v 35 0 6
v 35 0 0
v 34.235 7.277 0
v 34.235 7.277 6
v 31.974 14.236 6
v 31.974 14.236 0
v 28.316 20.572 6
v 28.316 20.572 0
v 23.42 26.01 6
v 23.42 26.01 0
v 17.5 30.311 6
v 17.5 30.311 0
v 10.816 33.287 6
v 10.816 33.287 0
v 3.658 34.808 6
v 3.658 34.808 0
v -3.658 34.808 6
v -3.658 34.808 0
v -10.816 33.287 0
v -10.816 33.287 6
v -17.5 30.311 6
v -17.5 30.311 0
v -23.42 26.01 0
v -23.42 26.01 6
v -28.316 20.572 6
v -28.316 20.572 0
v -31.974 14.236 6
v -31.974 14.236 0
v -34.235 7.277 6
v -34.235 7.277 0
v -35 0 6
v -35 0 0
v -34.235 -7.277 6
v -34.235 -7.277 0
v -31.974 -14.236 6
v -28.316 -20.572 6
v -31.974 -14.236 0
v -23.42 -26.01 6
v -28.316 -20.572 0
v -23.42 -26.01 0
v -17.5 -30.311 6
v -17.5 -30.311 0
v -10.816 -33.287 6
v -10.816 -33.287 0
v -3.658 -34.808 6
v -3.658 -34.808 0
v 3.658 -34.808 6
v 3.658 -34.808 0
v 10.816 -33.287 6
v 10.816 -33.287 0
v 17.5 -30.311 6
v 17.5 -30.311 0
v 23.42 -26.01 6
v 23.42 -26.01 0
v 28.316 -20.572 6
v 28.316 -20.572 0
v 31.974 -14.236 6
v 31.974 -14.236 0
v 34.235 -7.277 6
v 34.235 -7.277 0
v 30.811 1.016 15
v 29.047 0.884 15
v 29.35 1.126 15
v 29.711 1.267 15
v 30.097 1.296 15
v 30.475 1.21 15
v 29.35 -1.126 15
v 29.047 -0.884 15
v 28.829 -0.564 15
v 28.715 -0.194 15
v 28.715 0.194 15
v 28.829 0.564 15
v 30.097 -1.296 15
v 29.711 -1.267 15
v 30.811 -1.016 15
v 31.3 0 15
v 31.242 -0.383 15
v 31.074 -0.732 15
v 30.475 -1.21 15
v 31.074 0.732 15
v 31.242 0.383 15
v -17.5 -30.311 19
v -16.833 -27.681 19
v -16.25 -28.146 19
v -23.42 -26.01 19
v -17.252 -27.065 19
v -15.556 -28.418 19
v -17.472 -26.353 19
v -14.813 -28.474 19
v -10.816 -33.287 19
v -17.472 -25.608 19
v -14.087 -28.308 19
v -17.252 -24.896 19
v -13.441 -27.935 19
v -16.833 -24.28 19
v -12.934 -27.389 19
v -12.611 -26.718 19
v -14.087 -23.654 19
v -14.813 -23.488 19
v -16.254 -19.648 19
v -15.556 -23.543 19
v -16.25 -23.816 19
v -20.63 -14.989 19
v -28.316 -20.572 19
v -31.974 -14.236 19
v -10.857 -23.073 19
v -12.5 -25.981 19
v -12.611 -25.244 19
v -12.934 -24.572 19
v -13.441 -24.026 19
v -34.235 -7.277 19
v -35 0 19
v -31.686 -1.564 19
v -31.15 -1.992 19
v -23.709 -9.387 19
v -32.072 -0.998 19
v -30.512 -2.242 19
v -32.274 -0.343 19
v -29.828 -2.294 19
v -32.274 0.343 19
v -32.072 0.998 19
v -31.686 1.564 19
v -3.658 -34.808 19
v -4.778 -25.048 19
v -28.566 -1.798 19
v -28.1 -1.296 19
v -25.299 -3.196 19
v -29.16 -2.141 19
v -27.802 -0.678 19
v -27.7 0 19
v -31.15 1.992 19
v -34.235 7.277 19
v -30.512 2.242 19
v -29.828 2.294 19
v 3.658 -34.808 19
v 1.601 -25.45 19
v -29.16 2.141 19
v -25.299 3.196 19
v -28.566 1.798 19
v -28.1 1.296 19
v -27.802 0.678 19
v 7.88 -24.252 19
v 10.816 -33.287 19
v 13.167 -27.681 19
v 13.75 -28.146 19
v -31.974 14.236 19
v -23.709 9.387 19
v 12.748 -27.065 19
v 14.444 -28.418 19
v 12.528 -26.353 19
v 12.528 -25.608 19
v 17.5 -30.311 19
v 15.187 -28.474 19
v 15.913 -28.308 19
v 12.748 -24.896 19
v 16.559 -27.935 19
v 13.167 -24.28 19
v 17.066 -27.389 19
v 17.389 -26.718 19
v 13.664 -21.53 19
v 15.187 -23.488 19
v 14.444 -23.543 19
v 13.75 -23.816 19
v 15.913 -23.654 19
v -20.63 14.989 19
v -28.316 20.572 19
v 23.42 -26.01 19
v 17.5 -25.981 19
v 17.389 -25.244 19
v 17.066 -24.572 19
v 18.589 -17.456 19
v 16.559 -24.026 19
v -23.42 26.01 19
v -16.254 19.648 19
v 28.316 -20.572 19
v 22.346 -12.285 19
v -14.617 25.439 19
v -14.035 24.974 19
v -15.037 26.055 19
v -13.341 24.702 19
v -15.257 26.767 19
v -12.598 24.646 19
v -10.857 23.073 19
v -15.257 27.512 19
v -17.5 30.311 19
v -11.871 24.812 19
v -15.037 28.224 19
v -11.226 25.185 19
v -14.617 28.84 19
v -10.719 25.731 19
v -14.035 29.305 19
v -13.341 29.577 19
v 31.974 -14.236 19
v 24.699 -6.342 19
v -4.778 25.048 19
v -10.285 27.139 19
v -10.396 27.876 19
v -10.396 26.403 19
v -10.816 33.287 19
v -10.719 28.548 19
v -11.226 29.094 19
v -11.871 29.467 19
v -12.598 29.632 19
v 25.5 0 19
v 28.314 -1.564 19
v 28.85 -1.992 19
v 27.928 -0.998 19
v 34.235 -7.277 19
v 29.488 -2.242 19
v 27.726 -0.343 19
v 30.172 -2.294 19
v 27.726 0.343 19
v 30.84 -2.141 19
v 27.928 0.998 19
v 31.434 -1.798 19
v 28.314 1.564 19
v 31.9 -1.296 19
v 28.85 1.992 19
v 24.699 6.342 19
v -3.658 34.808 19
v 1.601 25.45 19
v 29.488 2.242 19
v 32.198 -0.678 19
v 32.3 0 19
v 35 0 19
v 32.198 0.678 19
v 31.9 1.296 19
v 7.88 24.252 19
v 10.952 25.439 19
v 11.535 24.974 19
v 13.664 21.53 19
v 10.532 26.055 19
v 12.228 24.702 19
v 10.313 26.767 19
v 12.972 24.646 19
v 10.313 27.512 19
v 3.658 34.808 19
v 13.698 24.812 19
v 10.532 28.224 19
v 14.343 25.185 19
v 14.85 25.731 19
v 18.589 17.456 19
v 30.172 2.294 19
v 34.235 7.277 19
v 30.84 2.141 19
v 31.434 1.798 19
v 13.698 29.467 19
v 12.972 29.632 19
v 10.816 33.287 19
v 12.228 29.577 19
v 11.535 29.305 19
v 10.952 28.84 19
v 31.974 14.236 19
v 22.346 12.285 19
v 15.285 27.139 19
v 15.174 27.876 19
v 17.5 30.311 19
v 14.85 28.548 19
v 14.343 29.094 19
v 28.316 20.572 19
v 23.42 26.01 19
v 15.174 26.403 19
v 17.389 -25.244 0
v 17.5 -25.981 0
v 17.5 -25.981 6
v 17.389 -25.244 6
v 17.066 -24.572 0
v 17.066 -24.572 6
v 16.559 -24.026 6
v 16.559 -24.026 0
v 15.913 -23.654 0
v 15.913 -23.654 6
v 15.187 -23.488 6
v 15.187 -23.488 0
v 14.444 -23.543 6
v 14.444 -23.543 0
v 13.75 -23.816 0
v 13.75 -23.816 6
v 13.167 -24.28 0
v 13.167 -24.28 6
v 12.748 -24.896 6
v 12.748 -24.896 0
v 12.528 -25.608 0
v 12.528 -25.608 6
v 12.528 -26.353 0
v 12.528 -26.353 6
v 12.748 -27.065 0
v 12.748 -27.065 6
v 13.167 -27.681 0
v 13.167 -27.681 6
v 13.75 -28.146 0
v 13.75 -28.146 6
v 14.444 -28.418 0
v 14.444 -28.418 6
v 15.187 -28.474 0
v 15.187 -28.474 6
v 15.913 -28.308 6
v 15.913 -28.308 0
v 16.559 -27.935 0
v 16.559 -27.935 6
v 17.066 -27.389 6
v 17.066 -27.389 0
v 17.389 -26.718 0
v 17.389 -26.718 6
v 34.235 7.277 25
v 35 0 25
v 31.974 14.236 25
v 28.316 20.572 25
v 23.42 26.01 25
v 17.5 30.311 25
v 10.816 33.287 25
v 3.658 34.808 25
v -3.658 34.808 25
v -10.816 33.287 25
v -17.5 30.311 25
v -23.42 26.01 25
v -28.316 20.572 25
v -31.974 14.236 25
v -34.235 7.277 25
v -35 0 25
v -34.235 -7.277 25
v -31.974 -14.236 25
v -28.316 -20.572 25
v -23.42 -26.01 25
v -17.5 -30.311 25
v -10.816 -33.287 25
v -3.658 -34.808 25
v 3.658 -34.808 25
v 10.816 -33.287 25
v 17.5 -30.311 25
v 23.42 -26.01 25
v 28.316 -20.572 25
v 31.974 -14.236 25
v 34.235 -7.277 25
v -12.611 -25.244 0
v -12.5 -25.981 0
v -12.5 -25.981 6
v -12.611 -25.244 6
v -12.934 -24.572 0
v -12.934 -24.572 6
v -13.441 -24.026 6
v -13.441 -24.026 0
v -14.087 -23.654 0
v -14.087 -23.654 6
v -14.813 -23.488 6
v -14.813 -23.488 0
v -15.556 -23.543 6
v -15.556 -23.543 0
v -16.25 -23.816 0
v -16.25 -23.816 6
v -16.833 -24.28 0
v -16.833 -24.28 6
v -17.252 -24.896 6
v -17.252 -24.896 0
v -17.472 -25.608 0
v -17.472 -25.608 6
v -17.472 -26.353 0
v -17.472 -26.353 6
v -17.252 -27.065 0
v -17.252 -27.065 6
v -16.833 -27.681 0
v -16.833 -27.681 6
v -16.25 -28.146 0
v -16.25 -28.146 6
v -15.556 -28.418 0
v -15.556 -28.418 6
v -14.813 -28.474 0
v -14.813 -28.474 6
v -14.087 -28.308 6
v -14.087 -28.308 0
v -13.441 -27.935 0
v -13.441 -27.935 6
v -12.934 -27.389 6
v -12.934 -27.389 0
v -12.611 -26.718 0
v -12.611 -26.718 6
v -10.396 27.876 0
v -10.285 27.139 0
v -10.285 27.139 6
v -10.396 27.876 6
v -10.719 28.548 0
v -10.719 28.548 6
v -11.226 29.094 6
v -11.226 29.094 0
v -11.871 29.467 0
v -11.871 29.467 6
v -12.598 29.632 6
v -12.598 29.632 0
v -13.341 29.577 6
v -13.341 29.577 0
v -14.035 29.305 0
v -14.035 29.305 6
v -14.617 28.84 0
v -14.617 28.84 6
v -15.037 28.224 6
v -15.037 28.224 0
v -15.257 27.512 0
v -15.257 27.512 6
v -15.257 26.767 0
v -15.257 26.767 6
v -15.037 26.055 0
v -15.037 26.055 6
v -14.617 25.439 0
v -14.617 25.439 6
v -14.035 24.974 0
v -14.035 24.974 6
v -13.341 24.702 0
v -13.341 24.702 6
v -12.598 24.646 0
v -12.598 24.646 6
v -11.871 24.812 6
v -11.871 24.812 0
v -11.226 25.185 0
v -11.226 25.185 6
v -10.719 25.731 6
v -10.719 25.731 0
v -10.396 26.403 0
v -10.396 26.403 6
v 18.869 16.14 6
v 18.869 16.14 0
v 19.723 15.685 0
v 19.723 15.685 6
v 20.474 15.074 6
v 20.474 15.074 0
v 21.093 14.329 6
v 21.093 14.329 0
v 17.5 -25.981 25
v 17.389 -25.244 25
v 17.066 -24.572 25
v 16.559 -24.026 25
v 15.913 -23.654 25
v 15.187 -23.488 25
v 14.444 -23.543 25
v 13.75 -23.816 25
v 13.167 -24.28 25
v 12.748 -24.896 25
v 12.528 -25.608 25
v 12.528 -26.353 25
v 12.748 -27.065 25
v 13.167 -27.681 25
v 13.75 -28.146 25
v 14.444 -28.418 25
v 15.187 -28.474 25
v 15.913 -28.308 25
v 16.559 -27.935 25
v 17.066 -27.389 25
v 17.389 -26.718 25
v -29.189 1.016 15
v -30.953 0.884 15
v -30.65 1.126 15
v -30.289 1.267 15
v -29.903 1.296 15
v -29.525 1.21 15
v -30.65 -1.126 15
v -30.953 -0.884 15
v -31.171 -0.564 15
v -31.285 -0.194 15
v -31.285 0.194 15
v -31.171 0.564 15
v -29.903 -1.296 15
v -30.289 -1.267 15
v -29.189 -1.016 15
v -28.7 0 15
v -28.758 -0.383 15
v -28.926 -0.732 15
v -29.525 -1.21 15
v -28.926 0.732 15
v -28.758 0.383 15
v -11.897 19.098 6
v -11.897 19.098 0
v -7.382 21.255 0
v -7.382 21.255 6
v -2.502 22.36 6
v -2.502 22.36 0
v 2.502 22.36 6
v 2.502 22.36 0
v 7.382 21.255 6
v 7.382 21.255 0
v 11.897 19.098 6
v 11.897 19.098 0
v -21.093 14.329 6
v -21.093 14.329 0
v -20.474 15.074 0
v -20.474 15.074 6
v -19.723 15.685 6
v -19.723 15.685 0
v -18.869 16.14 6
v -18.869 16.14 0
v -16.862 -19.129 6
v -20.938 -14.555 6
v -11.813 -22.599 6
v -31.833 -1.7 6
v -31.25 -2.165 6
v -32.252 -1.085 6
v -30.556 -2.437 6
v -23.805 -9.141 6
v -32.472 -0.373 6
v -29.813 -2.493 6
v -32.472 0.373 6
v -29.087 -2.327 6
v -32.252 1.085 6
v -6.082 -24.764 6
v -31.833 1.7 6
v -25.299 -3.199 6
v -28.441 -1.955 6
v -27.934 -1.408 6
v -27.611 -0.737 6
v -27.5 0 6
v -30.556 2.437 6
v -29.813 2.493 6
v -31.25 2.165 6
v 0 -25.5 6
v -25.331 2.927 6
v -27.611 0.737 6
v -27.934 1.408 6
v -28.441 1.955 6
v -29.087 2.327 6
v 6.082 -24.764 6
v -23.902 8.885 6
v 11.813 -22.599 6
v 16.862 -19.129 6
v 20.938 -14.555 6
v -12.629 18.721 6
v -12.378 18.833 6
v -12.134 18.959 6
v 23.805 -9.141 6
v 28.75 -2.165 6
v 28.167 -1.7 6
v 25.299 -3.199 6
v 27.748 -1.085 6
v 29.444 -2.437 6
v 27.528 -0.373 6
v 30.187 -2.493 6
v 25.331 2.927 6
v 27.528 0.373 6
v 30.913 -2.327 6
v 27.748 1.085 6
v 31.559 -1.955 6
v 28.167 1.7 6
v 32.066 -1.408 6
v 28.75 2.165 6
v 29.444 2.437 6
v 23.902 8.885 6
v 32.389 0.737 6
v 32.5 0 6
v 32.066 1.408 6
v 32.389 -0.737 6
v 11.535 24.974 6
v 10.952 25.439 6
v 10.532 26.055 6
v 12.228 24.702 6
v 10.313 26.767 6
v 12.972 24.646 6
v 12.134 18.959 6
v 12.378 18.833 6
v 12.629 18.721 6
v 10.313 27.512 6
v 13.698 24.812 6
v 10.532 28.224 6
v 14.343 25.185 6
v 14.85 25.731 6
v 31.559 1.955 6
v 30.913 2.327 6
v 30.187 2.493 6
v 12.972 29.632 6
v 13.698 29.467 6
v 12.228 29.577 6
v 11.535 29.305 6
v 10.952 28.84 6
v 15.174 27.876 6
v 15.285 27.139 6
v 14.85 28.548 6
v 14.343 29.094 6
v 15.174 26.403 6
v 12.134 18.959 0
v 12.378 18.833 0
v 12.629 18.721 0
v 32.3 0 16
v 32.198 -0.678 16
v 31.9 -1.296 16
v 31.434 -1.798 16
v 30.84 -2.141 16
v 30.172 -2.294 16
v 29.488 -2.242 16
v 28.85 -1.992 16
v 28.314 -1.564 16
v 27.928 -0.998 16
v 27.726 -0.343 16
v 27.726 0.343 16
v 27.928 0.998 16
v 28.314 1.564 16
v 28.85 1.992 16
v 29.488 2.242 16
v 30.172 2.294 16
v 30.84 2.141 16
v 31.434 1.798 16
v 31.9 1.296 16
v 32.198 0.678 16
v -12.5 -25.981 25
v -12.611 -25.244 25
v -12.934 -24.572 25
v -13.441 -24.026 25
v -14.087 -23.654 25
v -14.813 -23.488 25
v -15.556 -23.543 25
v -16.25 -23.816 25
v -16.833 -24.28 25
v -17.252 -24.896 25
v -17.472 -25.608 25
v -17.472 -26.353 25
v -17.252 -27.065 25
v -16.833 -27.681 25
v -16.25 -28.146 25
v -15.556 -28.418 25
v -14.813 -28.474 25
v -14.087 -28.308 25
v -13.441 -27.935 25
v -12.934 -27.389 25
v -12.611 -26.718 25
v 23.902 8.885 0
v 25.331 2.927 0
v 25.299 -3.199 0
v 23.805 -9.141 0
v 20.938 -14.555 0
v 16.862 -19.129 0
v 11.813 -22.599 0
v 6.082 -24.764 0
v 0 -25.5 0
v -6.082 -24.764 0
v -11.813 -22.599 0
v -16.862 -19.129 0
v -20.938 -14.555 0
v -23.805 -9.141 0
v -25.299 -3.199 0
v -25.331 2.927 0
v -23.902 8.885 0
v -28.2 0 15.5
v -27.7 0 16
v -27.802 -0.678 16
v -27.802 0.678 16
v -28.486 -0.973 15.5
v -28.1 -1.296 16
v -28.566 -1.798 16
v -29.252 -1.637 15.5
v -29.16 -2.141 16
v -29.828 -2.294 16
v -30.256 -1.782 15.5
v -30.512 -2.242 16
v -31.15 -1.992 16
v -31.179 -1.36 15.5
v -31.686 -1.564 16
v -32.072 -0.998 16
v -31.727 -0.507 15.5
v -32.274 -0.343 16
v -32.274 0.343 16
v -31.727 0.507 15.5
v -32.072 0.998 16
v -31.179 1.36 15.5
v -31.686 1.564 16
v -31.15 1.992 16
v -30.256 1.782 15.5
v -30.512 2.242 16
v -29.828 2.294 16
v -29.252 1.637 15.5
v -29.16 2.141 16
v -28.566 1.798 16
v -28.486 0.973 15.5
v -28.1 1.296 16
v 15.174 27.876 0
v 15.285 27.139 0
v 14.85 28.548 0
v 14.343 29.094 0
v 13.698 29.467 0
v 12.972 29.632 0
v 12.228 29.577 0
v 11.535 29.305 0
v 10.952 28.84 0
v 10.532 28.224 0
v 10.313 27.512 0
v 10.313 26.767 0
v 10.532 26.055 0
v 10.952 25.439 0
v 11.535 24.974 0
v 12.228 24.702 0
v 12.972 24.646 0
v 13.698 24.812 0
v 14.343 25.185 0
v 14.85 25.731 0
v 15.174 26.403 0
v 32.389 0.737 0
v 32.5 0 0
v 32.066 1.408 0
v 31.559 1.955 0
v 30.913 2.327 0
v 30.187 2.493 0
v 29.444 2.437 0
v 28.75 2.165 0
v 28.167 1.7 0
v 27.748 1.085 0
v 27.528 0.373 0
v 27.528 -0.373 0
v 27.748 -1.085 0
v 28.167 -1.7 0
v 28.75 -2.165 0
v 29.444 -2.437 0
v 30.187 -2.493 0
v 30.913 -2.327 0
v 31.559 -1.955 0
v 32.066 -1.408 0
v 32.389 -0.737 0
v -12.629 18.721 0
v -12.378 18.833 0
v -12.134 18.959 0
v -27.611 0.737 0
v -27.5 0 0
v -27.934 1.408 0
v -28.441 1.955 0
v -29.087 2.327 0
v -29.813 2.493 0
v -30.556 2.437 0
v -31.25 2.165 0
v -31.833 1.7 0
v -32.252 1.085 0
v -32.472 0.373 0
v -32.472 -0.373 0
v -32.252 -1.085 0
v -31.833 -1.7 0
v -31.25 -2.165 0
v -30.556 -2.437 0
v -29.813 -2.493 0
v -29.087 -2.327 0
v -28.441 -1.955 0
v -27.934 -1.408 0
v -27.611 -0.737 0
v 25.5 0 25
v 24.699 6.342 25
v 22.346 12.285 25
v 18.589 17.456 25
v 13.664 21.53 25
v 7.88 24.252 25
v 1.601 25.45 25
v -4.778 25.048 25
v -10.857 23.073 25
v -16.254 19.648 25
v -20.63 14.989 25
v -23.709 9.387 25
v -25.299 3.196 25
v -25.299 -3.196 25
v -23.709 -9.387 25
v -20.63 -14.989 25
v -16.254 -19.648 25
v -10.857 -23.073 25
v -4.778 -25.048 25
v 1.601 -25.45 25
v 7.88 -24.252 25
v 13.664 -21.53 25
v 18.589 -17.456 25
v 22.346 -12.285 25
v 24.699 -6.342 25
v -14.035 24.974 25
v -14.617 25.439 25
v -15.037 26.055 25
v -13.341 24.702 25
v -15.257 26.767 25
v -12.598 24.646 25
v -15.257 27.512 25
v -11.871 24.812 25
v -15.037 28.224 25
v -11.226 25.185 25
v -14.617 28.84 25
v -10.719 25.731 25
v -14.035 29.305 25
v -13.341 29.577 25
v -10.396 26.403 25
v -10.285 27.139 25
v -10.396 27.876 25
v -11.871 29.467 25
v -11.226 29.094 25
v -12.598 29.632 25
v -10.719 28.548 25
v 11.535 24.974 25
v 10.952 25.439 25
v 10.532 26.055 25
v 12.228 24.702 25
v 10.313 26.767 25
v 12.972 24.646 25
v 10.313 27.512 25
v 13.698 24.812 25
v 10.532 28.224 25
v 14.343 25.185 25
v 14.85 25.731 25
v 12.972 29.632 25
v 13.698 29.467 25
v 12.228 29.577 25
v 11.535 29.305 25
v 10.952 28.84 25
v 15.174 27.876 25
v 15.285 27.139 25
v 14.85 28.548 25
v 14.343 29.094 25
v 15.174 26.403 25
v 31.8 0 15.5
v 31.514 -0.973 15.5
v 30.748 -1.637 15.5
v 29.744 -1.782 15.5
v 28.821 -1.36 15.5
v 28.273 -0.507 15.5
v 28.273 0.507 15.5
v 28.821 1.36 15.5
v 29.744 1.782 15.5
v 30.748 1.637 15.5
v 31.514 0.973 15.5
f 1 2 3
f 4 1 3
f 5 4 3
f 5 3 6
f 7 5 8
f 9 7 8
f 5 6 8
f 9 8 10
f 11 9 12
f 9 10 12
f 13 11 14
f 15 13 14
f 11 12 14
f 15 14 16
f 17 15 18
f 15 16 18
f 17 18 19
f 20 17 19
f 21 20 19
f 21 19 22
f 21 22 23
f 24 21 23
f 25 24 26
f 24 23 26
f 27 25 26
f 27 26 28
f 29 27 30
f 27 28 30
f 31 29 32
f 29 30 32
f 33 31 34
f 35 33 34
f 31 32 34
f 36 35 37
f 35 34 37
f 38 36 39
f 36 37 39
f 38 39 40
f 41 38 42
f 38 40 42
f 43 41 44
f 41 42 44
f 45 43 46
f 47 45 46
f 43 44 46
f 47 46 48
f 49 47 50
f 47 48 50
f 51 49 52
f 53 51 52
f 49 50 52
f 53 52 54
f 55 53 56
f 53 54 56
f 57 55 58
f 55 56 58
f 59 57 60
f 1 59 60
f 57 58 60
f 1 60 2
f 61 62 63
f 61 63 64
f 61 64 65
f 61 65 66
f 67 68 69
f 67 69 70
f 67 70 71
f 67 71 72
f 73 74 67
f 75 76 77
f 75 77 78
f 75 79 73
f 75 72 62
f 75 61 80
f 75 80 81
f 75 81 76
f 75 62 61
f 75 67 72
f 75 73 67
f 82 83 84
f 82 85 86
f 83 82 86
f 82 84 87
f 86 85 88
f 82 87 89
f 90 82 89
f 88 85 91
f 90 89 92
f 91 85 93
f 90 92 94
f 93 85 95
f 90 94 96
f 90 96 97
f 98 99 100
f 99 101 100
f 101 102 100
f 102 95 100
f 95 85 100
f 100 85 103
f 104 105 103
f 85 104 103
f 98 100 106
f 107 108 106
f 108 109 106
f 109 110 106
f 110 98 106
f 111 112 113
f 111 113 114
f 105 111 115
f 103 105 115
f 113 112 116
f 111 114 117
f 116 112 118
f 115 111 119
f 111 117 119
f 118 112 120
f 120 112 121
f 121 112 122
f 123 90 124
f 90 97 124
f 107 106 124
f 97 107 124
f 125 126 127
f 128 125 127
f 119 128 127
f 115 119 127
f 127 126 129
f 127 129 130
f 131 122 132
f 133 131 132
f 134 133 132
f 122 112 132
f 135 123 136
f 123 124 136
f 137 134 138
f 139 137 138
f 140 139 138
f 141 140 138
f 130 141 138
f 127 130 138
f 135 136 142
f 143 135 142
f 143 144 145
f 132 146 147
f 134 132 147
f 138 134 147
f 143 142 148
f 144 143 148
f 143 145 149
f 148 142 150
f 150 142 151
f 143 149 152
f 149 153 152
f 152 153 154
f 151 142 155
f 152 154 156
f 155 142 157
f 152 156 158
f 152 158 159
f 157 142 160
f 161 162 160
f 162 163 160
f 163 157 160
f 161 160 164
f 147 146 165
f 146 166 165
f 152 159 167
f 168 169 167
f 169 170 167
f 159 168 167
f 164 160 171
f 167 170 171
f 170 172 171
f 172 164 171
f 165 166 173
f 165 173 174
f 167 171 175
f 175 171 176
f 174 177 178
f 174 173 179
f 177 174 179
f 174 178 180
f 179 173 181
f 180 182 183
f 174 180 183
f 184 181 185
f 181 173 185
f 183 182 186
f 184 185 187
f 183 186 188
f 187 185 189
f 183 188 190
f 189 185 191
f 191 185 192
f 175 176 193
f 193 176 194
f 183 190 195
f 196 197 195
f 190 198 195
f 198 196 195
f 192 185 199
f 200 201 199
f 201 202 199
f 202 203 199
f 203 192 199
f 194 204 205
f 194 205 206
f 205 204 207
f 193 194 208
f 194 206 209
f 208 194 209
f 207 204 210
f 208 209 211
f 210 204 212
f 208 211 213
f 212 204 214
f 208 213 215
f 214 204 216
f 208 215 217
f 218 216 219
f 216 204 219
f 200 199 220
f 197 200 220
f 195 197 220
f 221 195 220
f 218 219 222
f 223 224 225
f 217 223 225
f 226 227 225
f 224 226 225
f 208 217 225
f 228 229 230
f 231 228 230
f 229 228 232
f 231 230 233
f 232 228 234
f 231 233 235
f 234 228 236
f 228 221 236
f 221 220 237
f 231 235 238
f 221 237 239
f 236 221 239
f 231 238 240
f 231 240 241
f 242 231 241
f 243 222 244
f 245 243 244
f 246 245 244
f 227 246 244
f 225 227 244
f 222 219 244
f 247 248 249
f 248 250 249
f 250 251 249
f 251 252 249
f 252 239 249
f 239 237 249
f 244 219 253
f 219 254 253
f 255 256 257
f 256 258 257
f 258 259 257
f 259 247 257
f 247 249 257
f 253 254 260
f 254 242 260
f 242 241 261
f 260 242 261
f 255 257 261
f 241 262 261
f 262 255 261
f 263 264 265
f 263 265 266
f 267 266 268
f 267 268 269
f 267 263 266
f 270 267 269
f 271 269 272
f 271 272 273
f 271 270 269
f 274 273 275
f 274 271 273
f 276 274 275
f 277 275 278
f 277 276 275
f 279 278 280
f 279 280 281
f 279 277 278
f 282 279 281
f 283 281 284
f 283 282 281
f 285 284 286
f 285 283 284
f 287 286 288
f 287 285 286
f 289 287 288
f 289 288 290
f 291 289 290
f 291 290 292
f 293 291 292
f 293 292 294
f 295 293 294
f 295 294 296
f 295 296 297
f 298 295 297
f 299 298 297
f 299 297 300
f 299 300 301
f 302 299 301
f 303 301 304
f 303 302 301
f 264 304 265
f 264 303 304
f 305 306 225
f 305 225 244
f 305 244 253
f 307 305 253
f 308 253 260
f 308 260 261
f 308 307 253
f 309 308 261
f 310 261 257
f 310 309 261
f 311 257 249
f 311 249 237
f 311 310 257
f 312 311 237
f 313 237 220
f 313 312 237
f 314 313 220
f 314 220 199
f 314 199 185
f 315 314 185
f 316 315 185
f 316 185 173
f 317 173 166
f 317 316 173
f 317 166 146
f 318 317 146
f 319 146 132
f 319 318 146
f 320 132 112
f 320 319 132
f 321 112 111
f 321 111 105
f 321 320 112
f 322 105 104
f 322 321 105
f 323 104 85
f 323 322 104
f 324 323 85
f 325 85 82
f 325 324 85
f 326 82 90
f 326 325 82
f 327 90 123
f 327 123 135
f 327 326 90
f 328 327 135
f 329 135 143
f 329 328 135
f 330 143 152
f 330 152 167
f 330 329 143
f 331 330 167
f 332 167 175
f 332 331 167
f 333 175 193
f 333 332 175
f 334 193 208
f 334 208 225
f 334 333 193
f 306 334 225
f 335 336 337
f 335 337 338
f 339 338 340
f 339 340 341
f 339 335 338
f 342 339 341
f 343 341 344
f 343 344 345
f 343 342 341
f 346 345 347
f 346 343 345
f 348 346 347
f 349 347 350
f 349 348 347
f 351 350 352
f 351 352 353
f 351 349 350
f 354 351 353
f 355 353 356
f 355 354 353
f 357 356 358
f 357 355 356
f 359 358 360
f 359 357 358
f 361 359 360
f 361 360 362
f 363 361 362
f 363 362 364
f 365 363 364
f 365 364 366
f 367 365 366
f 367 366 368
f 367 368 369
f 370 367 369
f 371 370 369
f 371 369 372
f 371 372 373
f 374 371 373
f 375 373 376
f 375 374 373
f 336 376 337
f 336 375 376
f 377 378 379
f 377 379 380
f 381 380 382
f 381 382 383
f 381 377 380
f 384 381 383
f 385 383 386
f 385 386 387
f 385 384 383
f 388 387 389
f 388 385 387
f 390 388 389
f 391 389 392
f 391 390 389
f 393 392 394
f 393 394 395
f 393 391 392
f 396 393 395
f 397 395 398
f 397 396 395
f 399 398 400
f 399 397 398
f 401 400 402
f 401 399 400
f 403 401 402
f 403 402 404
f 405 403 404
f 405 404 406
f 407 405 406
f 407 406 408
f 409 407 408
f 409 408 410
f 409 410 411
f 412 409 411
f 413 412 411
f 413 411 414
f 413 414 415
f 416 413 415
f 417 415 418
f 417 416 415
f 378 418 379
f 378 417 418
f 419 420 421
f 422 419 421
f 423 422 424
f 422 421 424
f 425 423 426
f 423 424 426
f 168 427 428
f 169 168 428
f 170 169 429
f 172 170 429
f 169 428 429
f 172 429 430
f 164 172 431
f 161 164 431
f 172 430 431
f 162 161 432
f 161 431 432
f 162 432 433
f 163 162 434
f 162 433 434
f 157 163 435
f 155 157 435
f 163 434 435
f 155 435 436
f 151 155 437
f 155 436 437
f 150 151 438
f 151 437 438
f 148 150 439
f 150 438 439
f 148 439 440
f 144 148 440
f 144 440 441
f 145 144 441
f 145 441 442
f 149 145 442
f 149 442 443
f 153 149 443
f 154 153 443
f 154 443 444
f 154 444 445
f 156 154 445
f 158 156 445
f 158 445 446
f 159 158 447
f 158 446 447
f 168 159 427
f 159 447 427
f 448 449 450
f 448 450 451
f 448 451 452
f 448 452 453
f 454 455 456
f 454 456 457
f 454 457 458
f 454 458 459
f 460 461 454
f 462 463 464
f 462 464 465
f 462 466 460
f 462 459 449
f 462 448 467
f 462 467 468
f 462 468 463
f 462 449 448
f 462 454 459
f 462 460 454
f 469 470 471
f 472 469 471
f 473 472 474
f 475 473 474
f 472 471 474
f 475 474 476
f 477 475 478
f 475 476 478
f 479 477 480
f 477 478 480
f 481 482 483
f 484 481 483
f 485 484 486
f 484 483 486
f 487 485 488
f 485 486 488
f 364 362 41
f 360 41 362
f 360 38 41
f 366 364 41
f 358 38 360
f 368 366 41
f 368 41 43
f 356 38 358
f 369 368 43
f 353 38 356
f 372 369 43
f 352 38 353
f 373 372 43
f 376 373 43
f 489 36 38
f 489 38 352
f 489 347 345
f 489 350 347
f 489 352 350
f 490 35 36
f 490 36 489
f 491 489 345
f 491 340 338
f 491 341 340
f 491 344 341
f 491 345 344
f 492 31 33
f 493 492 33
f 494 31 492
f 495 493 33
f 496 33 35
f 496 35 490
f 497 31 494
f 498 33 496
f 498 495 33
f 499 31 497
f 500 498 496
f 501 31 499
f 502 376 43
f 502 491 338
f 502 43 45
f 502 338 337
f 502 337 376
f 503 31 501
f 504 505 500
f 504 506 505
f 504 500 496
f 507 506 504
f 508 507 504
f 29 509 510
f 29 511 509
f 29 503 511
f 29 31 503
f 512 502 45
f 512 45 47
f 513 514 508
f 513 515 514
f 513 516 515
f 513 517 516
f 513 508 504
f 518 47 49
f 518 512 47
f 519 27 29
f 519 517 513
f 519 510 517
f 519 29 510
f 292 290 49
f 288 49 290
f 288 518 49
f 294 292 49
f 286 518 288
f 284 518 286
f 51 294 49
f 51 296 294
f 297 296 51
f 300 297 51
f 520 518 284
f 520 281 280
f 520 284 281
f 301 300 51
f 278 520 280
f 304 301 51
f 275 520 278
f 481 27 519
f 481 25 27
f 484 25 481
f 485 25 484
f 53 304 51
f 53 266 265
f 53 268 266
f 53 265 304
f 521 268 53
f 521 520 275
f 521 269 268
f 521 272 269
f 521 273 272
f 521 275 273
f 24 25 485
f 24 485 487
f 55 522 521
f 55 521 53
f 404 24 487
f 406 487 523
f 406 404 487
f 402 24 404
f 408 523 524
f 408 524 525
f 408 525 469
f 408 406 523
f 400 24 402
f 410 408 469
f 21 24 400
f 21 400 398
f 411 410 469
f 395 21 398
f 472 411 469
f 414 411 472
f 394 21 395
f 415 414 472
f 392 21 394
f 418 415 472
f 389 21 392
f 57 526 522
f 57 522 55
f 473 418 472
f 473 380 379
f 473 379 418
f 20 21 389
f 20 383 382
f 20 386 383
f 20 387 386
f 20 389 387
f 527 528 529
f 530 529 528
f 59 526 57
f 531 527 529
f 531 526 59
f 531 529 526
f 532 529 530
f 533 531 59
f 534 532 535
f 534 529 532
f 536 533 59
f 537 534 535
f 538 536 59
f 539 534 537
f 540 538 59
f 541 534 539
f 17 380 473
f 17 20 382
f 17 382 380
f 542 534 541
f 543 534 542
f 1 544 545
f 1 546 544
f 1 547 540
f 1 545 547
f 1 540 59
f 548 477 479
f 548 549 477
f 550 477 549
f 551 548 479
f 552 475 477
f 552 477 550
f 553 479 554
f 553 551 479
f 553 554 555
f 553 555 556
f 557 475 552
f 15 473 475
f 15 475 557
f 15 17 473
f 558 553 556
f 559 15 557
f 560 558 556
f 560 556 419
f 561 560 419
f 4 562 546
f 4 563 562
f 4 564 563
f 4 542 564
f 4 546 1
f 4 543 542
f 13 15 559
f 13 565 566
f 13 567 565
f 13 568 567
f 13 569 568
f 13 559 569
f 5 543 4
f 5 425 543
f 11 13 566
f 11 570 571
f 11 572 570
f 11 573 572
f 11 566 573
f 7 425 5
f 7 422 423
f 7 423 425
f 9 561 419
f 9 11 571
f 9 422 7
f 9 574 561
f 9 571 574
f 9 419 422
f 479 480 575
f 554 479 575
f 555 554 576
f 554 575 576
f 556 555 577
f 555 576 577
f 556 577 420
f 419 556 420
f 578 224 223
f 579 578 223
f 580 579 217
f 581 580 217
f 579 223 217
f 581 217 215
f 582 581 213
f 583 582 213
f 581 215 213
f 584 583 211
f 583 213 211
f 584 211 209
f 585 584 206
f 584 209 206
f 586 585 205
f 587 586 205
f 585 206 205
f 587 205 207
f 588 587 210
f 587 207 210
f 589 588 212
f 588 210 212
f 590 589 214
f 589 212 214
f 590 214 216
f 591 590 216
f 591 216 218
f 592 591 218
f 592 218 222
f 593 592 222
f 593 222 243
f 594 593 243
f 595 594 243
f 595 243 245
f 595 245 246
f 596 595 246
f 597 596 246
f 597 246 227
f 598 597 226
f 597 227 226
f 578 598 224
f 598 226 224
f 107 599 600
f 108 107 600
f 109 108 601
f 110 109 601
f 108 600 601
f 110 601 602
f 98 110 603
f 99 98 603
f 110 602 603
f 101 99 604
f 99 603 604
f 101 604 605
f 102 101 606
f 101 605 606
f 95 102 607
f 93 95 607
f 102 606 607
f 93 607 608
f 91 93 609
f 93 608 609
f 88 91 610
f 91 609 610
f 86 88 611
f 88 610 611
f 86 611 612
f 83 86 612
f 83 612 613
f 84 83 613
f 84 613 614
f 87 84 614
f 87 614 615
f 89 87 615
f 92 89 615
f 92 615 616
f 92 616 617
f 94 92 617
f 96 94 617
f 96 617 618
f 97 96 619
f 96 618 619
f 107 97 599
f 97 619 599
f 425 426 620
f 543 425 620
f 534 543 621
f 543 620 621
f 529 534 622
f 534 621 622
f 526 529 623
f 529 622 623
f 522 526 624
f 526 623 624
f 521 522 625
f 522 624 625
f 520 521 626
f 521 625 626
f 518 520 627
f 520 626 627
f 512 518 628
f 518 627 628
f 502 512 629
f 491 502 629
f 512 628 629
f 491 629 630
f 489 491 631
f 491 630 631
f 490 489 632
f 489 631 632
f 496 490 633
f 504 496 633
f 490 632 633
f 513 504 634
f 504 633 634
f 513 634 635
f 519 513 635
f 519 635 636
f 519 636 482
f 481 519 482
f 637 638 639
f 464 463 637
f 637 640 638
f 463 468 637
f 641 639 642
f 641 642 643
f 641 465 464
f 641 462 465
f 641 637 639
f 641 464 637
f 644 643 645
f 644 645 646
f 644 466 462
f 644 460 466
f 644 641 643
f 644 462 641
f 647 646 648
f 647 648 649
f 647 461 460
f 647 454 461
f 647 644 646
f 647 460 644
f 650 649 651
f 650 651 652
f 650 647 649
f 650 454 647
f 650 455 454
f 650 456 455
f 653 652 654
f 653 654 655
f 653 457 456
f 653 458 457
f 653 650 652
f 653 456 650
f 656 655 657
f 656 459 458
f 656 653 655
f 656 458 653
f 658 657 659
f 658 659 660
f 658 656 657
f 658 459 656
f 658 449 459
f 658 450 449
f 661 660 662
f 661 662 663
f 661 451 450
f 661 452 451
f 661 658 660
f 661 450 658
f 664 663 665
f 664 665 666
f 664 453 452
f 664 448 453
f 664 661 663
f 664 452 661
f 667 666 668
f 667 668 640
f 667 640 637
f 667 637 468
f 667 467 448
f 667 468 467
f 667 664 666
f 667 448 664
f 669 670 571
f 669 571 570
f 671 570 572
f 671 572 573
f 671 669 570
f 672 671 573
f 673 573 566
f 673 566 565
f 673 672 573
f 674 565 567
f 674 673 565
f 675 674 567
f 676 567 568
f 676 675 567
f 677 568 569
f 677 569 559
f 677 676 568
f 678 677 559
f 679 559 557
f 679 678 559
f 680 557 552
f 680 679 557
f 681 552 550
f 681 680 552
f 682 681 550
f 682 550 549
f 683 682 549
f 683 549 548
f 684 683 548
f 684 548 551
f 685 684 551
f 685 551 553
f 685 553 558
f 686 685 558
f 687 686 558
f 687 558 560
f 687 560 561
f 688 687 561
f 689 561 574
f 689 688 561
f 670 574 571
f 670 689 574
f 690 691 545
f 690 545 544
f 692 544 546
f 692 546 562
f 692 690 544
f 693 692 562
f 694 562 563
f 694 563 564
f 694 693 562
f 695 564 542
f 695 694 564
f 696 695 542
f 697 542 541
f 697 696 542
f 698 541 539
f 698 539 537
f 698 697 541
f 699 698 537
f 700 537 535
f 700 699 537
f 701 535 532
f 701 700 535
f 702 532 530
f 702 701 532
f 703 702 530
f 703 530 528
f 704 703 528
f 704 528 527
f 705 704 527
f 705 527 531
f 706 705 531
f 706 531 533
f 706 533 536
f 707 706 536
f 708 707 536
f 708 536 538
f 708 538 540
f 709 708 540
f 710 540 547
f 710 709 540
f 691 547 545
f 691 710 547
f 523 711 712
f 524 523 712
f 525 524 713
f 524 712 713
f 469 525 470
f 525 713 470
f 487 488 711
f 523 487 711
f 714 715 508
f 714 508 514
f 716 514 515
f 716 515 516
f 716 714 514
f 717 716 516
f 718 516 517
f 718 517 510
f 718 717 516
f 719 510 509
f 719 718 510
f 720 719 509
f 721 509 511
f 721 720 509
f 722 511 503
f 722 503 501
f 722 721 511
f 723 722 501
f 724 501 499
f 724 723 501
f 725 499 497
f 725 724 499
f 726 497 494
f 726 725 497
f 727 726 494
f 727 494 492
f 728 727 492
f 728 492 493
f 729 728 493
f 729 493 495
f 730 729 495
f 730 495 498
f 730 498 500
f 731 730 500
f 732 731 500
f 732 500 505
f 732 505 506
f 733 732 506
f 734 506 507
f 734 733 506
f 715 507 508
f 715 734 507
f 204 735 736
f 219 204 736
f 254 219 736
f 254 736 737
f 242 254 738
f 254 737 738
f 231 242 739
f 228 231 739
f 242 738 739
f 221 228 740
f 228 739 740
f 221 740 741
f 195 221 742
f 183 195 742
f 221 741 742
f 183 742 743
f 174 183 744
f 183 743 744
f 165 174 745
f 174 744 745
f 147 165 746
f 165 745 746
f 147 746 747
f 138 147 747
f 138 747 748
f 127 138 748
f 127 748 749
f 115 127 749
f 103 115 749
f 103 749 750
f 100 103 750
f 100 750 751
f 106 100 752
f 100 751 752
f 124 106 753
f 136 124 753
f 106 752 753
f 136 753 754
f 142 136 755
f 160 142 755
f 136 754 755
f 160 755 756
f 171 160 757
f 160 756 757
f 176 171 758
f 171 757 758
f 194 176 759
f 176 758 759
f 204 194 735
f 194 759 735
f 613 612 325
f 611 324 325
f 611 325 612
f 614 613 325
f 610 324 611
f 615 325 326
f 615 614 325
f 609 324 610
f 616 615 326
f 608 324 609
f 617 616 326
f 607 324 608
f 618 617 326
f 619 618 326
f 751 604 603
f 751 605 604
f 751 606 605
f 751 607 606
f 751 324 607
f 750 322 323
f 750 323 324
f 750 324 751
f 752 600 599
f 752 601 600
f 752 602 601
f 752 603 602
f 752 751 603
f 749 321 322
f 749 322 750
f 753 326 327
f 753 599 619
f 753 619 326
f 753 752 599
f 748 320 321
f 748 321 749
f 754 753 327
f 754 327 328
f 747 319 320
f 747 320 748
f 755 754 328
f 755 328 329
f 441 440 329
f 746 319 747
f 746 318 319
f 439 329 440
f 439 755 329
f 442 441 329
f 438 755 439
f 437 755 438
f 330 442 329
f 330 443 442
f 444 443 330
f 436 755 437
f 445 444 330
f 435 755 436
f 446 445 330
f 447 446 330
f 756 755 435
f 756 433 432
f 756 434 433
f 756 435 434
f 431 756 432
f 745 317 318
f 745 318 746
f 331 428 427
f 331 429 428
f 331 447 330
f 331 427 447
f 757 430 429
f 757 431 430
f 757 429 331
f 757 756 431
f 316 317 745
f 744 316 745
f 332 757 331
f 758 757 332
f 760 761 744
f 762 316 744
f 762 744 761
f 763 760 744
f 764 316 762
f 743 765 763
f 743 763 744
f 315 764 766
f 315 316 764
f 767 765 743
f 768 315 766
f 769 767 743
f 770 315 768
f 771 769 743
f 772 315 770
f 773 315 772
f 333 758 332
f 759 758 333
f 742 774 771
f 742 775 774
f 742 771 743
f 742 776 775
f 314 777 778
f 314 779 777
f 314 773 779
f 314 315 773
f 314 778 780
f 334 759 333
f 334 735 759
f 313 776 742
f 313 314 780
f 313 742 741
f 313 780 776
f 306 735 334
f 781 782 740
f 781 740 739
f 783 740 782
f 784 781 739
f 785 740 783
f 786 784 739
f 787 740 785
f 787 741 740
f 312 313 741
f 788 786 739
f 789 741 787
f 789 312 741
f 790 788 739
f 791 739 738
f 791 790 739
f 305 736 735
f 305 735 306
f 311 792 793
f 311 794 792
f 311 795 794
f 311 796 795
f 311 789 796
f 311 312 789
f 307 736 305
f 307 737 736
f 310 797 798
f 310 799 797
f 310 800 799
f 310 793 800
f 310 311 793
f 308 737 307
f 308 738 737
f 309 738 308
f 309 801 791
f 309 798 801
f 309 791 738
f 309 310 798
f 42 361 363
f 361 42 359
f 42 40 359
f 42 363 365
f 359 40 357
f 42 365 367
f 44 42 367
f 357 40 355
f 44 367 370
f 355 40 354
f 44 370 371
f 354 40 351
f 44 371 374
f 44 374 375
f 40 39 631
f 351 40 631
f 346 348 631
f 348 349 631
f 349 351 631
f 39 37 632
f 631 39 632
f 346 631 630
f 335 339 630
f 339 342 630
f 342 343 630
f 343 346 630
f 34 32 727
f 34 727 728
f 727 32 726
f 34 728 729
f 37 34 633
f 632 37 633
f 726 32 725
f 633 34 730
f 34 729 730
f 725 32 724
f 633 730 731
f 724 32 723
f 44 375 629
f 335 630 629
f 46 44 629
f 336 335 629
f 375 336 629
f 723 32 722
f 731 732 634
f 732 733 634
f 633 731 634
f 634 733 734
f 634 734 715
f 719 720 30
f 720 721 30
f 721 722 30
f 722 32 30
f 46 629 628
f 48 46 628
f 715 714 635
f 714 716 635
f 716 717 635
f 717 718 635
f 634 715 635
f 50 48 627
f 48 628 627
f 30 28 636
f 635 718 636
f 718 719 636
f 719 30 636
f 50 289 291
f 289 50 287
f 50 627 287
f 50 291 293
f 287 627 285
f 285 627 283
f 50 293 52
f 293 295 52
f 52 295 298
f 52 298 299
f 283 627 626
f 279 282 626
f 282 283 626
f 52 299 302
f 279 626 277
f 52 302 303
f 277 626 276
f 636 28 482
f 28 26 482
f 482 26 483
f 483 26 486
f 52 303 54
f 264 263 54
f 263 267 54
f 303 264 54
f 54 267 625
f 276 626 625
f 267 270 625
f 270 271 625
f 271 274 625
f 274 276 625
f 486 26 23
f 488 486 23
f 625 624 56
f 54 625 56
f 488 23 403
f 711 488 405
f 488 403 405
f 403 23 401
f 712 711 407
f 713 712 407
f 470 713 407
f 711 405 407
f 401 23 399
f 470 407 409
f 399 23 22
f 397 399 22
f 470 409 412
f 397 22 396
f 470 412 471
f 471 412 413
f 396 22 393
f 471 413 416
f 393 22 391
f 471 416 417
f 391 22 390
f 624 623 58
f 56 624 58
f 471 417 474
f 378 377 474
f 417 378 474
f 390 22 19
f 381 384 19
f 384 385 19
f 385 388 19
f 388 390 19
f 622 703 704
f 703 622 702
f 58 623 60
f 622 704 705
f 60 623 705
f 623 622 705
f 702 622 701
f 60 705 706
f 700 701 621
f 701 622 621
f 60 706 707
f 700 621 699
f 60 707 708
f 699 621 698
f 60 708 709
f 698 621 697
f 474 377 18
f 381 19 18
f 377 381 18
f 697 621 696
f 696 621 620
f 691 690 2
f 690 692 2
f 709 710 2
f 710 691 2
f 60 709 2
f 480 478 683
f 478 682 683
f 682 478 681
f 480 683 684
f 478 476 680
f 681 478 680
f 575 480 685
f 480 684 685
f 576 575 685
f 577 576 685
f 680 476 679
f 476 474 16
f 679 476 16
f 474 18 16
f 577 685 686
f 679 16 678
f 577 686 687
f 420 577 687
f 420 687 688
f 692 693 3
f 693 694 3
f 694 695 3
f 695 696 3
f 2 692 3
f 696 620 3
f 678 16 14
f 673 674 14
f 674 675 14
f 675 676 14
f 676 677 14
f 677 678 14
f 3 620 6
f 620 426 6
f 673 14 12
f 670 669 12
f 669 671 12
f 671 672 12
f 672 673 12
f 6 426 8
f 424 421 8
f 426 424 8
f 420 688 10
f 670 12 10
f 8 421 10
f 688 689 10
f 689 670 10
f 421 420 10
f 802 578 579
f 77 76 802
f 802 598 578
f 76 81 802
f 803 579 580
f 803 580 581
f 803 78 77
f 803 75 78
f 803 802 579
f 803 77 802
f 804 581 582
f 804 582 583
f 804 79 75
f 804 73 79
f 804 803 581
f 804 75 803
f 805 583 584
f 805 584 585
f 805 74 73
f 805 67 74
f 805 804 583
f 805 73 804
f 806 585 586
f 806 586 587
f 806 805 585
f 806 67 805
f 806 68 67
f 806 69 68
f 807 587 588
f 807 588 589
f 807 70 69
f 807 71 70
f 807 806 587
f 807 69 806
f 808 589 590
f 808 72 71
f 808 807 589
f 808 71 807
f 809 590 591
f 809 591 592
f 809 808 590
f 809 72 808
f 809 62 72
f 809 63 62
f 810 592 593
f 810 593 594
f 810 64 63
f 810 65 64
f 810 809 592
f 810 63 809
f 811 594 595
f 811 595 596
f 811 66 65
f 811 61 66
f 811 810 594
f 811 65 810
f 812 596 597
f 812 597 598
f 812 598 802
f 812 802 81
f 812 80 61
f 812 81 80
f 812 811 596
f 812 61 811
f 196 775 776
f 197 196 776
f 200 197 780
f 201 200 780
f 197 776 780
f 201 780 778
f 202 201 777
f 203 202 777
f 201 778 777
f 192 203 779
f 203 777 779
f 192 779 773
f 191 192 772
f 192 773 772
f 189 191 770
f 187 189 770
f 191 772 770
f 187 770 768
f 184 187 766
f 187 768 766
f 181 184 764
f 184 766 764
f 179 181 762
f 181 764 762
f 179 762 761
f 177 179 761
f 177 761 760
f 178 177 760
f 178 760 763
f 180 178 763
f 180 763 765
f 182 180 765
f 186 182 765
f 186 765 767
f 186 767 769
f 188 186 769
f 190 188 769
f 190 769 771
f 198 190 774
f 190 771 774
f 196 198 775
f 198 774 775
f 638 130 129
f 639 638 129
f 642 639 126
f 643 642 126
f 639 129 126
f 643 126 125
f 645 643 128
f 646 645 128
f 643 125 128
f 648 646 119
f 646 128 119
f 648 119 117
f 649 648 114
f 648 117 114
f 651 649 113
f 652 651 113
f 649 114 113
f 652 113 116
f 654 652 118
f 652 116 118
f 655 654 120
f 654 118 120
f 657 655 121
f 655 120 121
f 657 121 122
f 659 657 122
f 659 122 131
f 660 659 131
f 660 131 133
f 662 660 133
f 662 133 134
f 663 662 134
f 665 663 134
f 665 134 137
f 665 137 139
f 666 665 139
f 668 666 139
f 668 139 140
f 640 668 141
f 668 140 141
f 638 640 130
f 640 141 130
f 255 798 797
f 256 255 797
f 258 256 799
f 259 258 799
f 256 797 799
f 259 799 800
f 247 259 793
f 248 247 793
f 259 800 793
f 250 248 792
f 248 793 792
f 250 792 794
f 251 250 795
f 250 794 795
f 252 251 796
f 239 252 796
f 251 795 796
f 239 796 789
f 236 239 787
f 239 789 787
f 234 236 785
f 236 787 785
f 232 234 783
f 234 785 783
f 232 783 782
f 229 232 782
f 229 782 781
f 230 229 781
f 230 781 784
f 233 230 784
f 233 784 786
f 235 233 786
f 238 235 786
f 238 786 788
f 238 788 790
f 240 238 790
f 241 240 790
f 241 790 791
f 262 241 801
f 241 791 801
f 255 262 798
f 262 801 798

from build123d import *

# Parameters (mm, degrees)
F0_R     = 35
F0_R_2   = 2.5
F1_DEPTH = 6
F3_R     = 35
F3_R_2   = 2.5
F3_R_3   = 25.5
F4_DEPTH = 6
F5_R     = 2.3
F6_DEPTH = 4
F7_SIZE  = 1


with BuildPart() as f1:
    # F0 (on Top) → F1 (new body)
    with BuildSketch(Plane.XY):
        Circle(F0_R)
        with Locations((-15, -25.980762)):
            Circle(F0_R_2, mode=Mode.SUBTRACT)
        with Locations((15, -25.980762)):
            Circle(F0_R_2, mode=Mode.SUBTRACT)
        with BuildLine():
            ThreePointArc((21.093135, 14.329328), (0, -25.5), (-21.093135, 14.329328))
            ThreePointArc((-21.093135, 14.329328), (-20.113505, 15.39753), (-18.868656, 16.139877))
            Line((-18.868656, 16.139877), (-12.629017, 18.721275))
            ThreePointArc((-12.629017, 18.721275), (-12.255114, 18.894333), (-11.896729, 19.097587))
            ThreePointArc((-11.896729, 19.097587), (0, 22.5), (11.896729, 19.097587))
            ThreePointArc((11.896729, 19.097587), (12.255114, 18.894333), (12.629017, 18.721275))
            Line((12.629017, 18.721275), (18.868656, 16.139877))
            ThreePointArc((18.868656, 16.139877), (20.113505, 15.39753), (21.093135, 14.329328))
        make_face(mode=Mode.SUBTRACT)
        with Locations((-30, 0)):
            Circle(F0_R_2, mode=Mode.SUBTRACT)
        with Locations((-12.784733, 27.139466)):
            Circle(F0_R_2, mode=Mode.SUBTRACT)
        with Locations((30, 0)):
            Circle(F0_R_2, mode=Mode.SUBTRACT)
        with Locations((12.784733, 27.139466)):
            Circle(F0_R_2, mode=Mode.SUBTRACT)
    extrude(amount=F1_DEPTH)


with BuildPart() as f4:
    # F3 (on offset) → F4 (new body)
    with BuildSketch(Plane.XY.offset(25)):
        Circle(F3_R)
        with Locations((-15, -25.980762)):
            Circle(F3_R_2, mode=Mode.SUBTRACT)
        with Locations((15, -25.980762)):
            Circle(F3_R_2, mode=Mode.SUBTRACT)
        with Locations((-12.784733, 27.139466)):
            Circle(F3_R_2, mode=Mode.SUBTRACT)
        Circle(F3_R_3, mode=Mode.SUBTRACT)
        with Locations((12.784733, 27.139466)):
            Circle(F3_R_2, mode=Mode.SUBTRACT)
    extrude(amount=-F4_DEPTH)

    # F5 (on face) → F6 (join)
    with BuildSketch(Plane(origin=(0, 0, 19), x_dir=(1, 0, 0), z_dir=(0, 0, -1))):
        with Locations((-30, 0)):
            Circle(F5_R)
        with Locations((30, 0)):
            Circle(F5_R)
    extrude(amount=F6_DEPTH)

    # F7
    f7_edges = [f4.edges().sort_by_distance(p)[0] for p in [
        (-32.3, 0, 15),
        (27.7, 0, 15),
    ]]
    chamfer(f7_edges, length=F7_SIZE)


solid = Compound([f1.part, f4.part])
